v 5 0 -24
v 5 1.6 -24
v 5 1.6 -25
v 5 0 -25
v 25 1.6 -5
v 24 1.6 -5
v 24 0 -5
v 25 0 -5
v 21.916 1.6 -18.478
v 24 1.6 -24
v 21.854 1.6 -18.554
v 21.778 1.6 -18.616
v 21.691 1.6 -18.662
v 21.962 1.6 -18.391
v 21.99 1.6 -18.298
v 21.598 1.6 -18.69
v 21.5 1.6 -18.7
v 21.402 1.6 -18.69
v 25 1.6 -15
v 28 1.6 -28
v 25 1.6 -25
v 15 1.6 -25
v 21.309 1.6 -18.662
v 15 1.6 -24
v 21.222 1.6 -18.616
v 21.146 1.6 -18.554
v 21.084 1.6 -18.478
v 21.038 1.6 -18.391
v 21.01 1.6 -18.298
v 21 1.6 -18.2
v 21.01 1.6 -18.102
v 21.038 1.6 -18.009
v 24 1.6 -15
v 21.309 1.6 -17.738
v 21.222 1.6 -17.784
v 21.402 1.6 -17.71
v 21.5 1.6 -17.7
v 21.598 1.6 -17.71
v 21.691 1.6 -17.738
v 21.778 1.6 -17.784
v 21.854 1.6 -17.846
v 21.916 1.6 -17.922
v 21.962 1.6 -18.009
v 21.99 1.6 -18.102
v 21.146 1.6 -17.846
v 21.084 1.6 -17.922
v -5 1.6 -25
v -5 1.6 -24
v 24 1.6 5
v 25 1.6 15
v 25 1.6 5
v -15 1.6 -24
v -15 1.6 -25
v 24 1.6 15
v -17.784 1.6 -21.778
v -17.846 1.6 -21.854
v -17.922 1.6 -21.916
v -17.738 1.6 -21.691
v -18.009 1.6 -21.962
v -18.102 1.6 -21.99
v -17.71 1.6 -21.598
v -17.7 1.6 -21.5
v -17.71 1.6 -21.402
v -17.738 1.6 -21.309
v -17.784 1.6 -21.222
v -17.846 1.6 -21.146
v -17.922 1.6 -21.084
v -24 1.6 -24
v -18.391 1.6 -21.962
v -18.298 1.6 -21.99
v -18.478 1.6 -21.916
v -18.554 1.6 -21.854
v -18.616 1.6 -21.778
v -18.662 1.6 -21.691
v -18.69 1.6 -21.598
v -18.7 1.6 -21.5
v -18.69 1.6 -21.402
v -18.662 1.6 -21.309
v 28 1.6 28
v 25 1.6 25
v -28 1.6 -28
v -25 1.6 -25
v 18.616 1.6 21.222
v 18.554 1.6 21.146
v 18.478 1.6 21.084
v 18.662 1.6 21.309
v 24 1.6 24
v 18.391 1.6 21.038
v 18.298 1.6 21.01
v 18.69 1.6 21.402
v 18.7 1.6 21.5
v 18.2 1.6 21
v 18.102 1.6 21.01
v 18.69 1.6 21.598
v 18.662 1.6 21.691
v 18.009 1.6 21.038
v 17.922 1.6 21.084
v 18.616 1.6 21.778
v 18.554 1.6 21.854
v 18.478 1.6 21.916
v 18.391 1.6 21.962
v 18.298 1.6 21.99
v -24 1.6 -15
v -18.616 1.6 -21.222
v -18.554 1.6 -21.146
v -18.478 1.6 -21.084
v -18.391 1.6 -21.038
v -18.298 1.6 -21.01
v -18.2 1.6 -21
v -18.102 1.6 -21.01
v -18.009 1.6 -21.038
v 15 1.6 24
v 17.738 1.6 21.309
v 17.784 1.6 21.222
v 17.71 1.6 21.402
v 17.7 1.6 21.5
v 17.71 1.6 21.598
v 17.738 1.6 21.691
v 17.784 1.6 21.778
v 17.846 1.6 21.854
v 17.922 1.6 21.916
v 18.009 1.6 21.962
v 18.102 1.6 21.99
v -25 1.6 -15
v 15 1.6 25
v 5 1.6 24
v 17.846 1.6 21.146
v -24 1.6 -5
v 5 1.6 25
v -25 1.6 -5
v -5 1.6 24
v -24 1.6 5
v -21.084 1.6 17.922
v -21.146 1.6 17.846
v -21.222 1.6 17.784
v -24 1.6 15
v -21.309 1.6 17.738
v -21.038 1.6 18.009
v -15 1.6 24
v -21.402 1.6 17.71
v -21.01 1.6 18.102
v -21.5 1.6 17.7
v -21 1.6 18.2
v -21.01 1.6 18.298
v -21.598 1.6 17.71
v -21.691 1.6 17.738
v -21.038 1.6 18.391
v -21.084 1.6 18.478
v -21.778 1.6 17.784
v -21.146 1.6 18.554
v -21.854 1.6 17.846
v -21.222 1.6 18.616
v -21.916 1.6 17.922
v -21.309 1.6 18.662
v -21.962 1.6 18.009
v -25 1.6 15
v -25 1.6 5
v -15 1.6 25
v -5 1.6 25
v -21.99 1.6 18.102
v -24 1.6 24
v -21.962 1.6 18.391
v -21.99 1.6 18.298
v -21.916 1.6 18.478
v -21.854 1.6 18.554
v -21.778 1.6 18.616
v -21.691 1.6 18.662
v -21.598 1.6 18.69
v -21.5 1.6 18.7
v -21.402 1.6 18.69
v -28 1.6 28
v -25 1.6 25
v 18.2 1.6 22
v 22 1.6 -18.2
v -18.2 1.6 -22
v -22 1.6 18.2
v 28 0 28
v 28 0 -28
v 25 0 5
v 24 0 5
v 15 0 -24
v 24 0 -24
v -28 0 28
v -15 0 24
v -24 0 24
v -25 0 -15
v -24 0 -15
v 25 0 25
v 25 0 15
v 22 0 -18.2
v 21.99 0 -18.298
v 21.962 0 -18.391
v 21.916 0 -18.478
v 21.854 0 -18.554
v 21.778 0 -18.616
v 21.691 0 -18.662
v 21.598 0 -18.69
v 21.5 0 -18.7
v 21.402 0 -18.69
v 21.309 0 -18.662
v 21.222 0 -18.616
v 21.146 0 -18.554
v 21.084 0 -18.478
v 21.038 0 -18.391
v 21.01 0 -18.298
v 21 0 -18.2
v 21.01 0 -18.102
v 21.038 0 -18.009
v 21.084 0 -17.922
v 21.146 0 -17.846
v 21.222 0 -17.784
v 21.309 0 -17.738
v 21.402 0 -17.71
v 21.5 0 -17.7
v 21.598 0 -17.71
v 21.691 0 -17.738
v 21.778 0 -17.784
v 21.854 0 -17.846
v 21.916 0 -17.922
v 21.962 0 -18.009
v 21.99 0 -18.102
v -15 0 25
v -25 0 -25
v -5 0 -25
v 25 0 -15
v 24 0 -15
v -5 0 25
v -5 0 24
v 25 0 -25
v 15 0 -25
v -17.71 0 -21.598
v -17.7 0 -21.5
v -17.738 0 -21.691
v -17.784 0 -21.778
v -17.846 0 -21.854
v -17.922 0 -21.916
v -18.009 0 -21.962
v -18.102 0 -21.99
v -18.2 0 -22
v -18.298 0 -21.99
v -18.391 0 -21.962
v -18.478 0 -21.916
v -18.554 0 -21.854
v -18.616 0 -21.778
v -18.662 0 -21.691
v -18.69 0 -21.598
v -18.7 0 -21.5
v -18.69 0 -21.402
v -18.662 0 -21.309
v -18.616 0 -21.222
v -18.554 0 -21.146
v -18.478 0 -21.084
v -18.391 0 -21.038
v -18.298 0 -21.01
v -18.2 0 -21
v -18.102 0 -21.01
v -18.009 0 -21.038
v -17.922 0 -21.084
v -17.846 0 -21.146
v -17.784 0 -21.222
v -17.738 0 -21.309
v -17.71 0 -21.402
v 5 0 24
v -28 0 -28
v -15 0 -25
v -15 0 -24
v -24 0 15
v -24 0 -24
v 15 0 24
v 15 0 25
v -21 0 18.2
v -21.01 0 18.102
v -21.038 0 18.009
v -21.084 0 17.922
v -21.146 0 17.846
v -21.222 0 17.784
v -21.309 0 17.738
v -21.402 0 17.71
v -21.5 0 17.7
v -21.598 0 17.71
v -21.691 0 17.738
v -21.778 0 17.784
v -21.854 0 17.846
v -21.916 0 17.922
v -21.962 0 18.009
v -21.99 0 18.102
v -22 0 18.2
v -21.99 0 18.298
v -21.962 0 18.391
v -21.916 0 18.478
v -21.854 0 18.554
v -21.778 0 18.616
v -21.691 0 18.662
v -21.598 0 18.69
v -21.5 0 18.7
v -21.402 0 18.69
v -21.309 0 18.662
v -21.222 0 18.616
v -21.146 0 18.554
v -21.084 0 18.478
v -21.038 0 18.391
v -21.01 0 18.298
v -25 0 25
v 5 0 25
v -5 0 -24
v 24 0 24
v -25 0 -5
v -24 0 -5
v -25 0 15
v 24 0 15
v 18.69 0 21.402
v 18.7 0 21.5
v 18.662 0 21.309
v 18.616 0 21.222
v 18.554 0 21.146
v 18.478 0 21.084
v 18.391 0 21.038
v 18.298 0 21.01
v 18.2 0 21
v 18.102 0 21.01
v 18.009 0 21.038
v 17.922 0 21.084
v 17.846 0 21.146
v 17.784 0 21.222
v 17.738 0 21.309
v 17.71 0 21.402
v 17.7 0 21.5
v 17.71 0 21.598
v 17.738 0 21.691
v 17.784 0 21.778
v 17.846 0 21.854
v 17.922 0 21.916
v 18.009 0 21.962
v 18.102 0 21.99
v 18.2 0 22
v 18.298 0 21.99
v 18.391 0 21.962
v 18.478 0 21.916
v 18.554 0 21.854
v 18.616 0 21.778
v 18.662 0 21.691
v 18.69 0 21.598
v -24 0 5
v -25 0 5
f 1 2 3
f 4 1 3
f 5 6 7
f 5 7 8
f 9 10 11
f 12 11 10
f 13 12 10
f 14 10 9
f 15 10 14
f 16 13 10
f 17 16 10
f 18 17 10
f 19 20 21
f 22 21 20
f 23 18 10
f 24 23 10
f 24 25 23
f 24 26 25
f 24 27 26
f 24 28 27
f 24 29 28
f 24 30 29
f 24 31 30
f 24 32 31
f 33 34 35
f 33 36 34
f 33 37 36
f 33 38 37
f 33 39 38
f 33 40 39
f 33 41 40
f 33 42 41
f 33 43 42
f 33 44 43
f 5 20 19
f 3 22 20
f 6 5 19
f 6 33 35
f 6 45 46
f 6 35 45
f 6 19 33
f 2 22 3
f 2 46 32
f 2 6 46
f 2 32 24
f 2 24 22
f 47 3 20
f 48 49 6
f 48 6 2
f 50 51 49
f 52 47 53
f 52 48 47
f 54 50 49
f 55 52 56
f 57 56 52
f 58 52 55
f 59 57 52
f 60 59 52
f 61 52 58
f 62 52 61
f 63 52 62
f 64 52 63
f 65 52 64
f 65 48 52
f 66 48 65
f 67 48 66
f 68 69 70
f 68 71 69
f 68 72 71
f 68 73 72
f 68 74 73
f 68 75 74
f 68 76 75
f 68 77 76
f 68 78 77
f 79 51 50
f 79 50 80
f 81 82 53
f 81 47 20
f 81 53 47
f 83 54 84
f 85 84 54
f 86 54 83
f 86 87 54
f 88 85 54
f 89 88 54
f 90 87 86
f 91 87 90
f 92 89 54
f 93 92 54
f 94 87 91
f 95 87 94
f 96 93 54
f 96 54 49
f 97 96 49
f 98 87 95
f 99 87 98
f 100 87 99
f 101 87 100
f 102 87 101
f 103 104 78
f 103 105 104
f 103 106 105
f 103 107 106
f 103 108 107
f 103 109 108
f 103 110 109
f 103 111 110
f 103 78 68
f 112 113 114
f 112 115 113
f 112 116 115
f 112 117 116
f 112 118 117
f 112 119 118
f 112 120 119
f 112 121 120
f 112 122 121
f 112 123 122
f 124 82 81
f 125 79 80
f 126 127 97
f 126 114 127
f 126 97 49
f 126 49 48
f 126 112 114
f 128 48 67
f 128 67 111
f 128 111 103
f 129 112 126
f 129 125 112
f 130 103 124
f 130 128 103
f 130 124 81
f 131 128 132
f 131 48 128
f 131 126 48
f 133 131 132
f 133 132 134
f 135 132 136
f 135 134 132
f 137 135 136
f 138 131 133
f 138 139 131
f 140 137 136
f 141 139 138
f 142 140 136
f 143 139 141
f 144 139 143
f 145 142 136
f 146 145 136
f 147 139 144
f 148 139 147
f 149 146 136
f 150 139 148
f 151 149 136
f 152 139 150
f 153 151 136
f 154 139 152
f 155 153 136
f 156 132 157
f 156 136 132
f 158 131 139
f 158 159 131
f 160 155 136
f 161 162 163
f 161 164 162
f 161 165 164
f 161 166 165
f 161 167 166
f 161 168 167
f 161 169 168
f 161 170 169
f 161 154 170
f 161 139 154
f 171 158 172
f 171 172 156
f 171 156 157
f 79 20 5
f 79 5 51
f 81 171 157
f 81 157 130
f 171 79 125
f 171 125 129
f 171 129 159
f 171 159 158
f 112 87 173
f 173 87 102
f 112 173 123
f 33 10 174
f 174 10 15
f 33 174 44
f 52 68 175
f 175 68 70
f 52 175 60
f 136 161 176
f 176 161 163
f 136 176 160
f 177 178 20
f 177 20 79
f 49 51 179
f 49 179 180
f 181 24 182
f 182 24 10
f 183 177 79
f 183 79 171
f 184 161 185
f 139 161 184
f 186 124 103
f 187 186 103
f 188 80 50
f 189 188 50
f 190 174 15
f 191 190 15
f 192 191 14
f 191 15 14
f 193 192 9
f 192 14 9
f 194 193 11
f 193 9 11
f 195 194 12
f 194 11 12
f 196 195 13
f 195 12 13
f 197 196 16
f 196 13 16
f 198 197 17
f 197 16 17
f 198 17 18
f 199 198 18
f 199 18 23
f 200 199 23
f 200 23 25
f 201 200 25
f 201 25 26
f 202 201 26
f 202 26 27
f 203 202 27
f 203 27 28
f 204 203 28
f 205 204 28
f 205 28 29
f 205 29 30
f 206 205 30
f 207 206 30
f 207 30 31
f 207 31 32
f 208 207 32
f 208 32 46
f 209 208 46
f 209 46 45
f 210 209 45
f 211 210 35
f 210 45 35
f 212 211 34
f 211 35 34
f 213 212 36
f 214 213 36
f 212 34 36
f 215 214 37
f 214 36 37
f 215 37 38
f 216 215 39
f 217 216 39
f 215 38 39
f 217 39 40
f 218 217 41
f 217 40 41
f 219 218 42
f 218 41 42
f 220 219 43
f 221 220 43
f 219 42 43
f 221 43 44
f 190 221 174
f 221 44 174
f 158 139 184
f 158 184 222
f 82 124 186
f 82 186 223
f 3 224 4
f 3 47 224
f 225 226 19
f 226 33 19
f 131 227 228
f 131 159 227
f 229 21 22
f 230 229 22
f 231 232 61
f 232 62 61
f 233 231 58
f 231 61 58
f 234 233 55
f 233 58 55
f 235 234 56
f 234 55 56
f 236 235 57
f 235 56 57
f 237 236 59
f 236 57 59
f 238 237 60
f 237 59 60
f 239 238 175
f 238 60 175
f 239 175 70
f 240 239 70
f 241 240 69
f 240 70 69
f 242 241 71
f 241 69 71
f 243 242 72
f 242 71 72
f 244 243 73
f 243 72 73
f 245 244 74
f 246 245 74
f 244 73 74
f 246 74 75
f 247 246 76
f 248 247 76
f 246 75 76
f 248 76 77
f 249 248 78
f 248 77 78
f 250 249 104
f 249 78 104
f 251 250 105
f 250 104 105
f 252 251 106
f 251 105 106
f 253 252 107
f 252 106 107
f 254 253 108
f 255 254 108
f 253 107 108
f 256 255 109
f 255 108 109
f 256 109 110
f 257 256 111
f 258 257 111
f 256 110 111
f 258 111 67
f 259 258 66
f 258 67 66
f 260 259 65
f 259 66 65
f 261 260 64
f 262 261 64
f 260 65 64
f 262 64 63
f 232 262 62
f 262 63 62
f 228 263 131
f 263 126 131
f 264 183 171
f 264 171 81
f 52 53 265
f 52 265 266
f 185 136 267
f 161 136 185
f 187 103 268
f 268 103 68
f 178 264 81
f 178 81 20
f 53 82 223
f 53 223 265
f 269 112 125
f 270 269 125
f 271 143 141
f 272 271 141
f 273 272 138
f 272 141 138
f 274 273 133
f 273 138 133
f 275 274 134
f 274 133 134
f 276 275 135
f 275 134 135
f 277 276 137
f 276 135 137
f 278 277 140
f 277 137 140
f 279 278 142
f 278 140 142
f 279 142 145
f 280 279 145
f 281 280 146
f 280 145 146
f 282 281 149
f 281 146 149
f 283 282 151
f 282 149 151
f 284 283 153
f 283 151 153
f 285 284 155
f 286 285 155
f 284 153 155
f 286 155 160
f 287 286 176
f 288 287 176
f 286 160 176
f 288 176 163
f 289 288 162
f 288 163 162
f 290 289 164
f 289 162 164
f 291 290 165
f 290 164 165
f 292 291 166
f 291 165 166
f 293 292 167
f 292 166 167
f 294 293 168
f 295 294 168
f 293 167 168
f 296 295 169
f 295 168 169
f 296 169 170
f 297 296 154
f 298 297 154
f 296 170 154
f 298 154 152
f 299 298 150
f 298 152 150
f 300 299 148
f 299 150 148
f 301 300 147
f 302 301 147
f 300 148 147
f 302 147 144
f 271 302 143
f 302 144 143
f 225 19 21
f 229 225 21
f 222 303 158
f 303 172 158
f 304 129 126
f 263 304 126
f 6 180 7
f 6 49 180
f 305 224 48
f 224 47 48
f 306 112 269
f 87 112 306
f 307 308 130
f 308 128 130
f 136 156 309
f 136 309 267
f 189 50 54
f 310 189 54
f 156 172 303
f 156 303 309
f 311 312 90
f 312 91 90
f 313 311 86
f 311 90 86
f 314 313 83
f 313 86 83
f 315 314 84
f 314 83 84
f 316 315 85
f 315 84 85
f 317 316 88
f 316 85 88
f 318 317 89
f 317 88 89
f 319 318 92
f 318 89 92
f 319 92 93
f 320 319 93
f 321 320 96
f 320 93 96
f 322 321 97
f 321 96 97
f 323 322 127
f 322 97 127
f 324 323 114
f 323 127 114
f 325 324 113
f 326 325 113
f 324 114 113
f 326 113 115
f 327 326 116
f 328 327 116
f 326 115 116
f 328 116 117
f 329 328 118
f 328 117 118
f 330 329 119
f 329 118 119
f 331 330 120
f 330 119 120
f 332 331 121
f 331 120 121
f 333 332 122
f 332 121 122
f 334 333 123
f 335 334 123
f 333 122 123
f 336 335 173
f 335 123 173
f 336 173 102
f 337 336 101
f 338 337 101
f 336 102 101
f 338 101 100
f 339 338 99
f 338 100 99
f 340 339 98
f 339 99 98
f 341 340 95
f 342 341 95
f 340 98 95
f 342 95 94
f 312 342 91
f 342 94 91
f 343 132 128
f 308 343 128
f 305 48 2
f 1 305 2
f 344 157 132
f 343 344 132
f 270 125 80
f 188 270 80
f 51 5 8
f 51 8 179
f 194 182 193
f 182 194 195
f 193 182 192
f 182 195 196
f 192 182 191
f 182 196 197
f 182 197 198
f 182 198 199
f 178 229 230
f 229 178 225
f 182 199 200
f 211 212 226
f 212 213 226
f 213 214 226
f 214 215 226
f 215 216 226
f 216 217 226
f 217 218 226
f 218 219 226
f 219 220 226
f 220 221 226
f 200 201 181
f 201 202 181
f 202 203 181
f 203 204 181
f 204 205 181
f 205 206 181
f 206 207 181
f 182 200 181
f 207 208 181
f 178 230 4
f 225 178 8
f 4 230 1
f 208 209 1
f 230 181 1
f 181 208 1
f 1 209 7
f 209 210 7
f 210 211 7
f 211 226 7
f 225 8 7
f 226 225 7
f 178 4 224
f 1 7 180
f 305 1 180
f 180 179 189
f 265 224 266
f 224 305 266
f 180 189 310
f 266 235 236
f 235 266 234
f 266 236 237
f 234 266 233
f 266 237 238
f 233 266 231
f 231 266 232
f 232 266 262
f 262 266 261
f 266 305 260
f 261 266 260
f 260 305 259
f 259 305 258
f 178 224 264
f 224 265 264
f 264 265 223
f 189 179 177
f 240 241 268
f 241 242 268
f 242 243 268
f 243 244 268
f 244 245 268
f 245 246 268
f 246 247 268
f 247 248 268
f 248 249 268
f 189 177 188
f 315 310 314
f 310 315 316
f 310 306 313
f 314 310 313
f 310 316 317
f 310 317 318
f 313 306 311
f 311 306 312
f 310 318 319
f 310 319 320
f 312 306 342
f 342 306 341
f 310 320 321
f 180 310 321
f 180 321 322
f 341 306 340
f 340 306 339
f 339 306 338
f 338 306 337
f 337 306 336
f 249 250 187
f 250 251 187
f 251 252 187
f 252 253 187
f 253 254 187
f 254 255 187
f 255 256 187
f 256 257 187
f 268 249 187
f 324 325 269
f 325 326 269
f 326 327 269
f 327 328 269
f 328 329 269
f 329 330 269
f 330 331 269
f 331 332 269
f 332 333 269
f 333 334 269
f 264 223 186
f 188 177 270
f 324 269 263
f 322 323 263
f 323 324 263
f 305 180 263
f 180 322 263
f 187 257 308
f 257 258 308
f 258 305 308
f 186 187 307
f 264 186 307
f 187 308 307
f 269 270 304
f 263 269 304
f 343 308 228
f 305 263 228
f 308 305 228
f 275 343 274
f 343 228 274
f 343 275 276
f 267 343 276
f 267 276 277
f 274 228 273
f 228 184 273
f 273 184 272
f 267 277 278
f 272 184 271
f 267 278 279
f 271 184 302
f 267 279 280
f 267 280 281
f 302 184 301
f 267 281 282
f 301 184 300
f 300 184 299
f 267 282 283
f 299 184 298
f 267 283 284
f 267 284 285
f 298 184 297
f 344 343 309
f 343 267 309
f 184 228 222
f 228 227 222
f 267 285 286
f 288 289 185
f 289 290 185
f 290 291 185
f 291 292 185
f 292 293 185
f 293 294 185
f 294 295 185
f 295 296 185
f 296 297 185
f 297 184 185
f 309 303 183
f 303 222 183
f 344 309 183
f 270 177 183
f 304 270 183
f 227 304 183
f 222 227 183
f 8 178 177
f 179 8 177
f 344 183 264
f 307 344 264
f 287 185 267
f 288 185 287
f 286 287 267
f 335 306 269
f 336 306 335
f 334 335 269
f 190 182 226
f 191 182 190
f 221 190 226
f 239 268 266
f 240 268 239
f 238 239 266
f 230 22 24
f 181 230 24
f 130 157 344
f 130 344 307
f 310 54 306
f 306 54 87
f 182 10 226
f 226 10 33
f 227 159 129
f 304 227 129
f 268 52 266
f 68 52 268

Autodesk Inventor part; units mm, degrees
ref_plane "YZ Plane" through (0, 0, 0) normal (1, 0, 0) x (0, 1, 0)
ref_plane "XZ Plane" through (0, 0, 0) normal (0, 1, 0) x (-1, 0, 0)
ref_plane "XY Plane" through (0, 0, 0) normal (0, 0, 1) x (1, 0, 0)
sketch "Sketch1" plane through (0, 0, 0) normal (0, 1, 0) x (-1, 0, 0)
  line L0 (-28, 28) -> (28, 28)
  line L1 (28, 28) -> (28, -28)
  line L2 (28, -28) -> (-28, -28)
  line L3 (-28, -28) -> (-28, 28)
  line L4 (-28, 28) -> (28, -28) construction
  line L5 (28, 28) -> (-28, -28) construction
  point P0 (0, 0)
  dimension "d0" = 56
  dimension "d1" = 56
extrude "Extrusion1" add sketch "Sketch1" along normal blind 1.6
sketch "Sketch2" plane through (0, 1.6, 0) normal (0, 1, 0) x (1, 0, 0)
  line L0 (25, -25) -> (-25, 25) construction
  line L1 (-25, -25) -> (25, 25) construction
  line L2 (-25, -25) -> (-25, -15)
  line L3 (-25, -15) -> (-24, -15)
  line L4 (-24, -15) -> (-24, -24)
  line L5 (-24, -24) -> (-15, -24)
  line L6 (-15, -24) -> (-15, -25)
  line L7 (15, -24) -> (15, -25)
  line L8 (-25, -25) -> (-15, -25)
  line L9 (-5, -25) -> (-5, -24)
  line L10 (-28, -28) -> (28, -28) projected
  line L11 (-25, 15) -> (-24, 15)
  line L12 (-25, -5) -> (-24, -5)
  line L13 (-24, -5) -> (-24, 5)
  line L14 (-24, 5) -> (-25, 5)
  line L15 (-25, -5) -> (-25, 5)
  line L16 (-28, 28) -> (-28, -28) projected
  line L17 (-5, 25) -> (-5, 24)
  line L18 (-5, 24) -> (5, 24)
  line L19 (5, 24) -> (5, 25)
  line L20 (25, 25) -> (15, 25)
  line L21 (15, 25) -> (15, 24)
  line L22 (15, 24) -> (24, 24)
  line L23 (24, 24) -> (24, 15)
  line L24 (24, 15) -> (25, 15)
  line L25 (-5, 25) -> (5, 25)
  line L26 (25, -5) -> (24, -5)
  line L27 (24, -5) -> (24, 5)
  line L28 (24, 5) -> (25, 5)
  line L29 (25, 5) -> (25, -5)
  line L30 (28, 28) -> (-28, 28) projected
  line L31 (25, 15) -> (25, 25)
  line L32 (15, -25) -> (25, -25)
  line L33 (25, -25) -> (25, -15)
  line L34 (25, -15) -> (24, -15)
  line L35 (24, -15) -> (24, -24)
  line L36 (15, -24) -> (24, -24)
  line L37 (-5, -25) -> (5, -25)
  line L38 (5, -25) -> (5, -24)
  line L39 (5, -24) -> (-5, -24)
  line L40 (-5, -24) -> (-5, -25)
  line L41 (-25, 15) -> (-25, 25)
  line L42 (-25, 25) -> (-15, 25)
  line L43 (-15, 25) -> (-15, 24)
  line L44 (-15, 24) -> (-24, 24)
  line L45 (-24, 15) -> (-24, 24)
  point P0 (0, 0)
  dimension "d4" = 50
  dimension "d5" = 50
  dimension "d6" = 10
  dimension "d7" = 1
  dimension "d8" = 9
  dimension "d9" = 9
  dimension "d16" = 10
  dimension "d17" = 10
  dimension "d18" = 1
  dimension "d21" = 1
  dimension "d22" = 10
  dimension "d23" = 3
  dimension "d24" = 10
  dimension "d25" = 1
  dimension "d27" = 10
  dimension "d28" = 10
  dimension "d29" = 1
  dimension "d30" = 9
  dimension "d31" = 9
  dimension "d32" = 1
  dimension "d33" = 10
  dimension "d34" = 1
  dimension "d35" = 10
  dimension "d36" = 3
  dimension "d37" = 10
  dimension "d38" = 10
  dimension "d39" = 10
  dimension "d40" = 10
  dimension "d41" = 10
extrude "Extrusion2" cut sketch "Sketch2" against normal blind 1.6
sketch "Sketch3" plane through (0, 1.6, 0) normal (0, 1, 0) x (1, 0, 0)
  circle A0 centre (-18.2, 21.5) radius 0.5
  circle A1 centre (21.5, 18.2) radius 0.5
  circle A2 centre (18.2, -21.5) radius 0.5
  circle A3 centre (-21.5, -18.2) radius 0.5
  line L0 (-25, -25) -> (-25, -15) projected
  line L1 (-15, -25) -> (-25, -25) projected
  line L2 (-25, 25) -> (-15, 25) projected
  line L3 (-25, 15) -> (-25, 25) projected
  line L4 (25, 25) -> (25, 15) projected
  line L5 (15, 25) -> (25, 25) projected
  line L6 (25, -15) -> (25, -25) projected
  line L7 (25, -25) -> (15, -25) projected
  point P0 (0, 0)
  dimension "d44" = 1
  dimension "d45" = 1
  dimension "d46" = 1
  dimension "d47" = 1
  dimension "d48" = 3.5
  dimension "d49" = 6.8
  dimension "d50" = 3.5
  dimension "d51" = 6.8
  dimension "d52" = 3.5
  dimension "d53" = 6.8
  dimension "d54" = 6.8
  dimension "d55" = 3.5
extrude "Extrusion3" cut sketch "Sketch3" against normal blind 1.6
properties part number "Bottom Panel"
